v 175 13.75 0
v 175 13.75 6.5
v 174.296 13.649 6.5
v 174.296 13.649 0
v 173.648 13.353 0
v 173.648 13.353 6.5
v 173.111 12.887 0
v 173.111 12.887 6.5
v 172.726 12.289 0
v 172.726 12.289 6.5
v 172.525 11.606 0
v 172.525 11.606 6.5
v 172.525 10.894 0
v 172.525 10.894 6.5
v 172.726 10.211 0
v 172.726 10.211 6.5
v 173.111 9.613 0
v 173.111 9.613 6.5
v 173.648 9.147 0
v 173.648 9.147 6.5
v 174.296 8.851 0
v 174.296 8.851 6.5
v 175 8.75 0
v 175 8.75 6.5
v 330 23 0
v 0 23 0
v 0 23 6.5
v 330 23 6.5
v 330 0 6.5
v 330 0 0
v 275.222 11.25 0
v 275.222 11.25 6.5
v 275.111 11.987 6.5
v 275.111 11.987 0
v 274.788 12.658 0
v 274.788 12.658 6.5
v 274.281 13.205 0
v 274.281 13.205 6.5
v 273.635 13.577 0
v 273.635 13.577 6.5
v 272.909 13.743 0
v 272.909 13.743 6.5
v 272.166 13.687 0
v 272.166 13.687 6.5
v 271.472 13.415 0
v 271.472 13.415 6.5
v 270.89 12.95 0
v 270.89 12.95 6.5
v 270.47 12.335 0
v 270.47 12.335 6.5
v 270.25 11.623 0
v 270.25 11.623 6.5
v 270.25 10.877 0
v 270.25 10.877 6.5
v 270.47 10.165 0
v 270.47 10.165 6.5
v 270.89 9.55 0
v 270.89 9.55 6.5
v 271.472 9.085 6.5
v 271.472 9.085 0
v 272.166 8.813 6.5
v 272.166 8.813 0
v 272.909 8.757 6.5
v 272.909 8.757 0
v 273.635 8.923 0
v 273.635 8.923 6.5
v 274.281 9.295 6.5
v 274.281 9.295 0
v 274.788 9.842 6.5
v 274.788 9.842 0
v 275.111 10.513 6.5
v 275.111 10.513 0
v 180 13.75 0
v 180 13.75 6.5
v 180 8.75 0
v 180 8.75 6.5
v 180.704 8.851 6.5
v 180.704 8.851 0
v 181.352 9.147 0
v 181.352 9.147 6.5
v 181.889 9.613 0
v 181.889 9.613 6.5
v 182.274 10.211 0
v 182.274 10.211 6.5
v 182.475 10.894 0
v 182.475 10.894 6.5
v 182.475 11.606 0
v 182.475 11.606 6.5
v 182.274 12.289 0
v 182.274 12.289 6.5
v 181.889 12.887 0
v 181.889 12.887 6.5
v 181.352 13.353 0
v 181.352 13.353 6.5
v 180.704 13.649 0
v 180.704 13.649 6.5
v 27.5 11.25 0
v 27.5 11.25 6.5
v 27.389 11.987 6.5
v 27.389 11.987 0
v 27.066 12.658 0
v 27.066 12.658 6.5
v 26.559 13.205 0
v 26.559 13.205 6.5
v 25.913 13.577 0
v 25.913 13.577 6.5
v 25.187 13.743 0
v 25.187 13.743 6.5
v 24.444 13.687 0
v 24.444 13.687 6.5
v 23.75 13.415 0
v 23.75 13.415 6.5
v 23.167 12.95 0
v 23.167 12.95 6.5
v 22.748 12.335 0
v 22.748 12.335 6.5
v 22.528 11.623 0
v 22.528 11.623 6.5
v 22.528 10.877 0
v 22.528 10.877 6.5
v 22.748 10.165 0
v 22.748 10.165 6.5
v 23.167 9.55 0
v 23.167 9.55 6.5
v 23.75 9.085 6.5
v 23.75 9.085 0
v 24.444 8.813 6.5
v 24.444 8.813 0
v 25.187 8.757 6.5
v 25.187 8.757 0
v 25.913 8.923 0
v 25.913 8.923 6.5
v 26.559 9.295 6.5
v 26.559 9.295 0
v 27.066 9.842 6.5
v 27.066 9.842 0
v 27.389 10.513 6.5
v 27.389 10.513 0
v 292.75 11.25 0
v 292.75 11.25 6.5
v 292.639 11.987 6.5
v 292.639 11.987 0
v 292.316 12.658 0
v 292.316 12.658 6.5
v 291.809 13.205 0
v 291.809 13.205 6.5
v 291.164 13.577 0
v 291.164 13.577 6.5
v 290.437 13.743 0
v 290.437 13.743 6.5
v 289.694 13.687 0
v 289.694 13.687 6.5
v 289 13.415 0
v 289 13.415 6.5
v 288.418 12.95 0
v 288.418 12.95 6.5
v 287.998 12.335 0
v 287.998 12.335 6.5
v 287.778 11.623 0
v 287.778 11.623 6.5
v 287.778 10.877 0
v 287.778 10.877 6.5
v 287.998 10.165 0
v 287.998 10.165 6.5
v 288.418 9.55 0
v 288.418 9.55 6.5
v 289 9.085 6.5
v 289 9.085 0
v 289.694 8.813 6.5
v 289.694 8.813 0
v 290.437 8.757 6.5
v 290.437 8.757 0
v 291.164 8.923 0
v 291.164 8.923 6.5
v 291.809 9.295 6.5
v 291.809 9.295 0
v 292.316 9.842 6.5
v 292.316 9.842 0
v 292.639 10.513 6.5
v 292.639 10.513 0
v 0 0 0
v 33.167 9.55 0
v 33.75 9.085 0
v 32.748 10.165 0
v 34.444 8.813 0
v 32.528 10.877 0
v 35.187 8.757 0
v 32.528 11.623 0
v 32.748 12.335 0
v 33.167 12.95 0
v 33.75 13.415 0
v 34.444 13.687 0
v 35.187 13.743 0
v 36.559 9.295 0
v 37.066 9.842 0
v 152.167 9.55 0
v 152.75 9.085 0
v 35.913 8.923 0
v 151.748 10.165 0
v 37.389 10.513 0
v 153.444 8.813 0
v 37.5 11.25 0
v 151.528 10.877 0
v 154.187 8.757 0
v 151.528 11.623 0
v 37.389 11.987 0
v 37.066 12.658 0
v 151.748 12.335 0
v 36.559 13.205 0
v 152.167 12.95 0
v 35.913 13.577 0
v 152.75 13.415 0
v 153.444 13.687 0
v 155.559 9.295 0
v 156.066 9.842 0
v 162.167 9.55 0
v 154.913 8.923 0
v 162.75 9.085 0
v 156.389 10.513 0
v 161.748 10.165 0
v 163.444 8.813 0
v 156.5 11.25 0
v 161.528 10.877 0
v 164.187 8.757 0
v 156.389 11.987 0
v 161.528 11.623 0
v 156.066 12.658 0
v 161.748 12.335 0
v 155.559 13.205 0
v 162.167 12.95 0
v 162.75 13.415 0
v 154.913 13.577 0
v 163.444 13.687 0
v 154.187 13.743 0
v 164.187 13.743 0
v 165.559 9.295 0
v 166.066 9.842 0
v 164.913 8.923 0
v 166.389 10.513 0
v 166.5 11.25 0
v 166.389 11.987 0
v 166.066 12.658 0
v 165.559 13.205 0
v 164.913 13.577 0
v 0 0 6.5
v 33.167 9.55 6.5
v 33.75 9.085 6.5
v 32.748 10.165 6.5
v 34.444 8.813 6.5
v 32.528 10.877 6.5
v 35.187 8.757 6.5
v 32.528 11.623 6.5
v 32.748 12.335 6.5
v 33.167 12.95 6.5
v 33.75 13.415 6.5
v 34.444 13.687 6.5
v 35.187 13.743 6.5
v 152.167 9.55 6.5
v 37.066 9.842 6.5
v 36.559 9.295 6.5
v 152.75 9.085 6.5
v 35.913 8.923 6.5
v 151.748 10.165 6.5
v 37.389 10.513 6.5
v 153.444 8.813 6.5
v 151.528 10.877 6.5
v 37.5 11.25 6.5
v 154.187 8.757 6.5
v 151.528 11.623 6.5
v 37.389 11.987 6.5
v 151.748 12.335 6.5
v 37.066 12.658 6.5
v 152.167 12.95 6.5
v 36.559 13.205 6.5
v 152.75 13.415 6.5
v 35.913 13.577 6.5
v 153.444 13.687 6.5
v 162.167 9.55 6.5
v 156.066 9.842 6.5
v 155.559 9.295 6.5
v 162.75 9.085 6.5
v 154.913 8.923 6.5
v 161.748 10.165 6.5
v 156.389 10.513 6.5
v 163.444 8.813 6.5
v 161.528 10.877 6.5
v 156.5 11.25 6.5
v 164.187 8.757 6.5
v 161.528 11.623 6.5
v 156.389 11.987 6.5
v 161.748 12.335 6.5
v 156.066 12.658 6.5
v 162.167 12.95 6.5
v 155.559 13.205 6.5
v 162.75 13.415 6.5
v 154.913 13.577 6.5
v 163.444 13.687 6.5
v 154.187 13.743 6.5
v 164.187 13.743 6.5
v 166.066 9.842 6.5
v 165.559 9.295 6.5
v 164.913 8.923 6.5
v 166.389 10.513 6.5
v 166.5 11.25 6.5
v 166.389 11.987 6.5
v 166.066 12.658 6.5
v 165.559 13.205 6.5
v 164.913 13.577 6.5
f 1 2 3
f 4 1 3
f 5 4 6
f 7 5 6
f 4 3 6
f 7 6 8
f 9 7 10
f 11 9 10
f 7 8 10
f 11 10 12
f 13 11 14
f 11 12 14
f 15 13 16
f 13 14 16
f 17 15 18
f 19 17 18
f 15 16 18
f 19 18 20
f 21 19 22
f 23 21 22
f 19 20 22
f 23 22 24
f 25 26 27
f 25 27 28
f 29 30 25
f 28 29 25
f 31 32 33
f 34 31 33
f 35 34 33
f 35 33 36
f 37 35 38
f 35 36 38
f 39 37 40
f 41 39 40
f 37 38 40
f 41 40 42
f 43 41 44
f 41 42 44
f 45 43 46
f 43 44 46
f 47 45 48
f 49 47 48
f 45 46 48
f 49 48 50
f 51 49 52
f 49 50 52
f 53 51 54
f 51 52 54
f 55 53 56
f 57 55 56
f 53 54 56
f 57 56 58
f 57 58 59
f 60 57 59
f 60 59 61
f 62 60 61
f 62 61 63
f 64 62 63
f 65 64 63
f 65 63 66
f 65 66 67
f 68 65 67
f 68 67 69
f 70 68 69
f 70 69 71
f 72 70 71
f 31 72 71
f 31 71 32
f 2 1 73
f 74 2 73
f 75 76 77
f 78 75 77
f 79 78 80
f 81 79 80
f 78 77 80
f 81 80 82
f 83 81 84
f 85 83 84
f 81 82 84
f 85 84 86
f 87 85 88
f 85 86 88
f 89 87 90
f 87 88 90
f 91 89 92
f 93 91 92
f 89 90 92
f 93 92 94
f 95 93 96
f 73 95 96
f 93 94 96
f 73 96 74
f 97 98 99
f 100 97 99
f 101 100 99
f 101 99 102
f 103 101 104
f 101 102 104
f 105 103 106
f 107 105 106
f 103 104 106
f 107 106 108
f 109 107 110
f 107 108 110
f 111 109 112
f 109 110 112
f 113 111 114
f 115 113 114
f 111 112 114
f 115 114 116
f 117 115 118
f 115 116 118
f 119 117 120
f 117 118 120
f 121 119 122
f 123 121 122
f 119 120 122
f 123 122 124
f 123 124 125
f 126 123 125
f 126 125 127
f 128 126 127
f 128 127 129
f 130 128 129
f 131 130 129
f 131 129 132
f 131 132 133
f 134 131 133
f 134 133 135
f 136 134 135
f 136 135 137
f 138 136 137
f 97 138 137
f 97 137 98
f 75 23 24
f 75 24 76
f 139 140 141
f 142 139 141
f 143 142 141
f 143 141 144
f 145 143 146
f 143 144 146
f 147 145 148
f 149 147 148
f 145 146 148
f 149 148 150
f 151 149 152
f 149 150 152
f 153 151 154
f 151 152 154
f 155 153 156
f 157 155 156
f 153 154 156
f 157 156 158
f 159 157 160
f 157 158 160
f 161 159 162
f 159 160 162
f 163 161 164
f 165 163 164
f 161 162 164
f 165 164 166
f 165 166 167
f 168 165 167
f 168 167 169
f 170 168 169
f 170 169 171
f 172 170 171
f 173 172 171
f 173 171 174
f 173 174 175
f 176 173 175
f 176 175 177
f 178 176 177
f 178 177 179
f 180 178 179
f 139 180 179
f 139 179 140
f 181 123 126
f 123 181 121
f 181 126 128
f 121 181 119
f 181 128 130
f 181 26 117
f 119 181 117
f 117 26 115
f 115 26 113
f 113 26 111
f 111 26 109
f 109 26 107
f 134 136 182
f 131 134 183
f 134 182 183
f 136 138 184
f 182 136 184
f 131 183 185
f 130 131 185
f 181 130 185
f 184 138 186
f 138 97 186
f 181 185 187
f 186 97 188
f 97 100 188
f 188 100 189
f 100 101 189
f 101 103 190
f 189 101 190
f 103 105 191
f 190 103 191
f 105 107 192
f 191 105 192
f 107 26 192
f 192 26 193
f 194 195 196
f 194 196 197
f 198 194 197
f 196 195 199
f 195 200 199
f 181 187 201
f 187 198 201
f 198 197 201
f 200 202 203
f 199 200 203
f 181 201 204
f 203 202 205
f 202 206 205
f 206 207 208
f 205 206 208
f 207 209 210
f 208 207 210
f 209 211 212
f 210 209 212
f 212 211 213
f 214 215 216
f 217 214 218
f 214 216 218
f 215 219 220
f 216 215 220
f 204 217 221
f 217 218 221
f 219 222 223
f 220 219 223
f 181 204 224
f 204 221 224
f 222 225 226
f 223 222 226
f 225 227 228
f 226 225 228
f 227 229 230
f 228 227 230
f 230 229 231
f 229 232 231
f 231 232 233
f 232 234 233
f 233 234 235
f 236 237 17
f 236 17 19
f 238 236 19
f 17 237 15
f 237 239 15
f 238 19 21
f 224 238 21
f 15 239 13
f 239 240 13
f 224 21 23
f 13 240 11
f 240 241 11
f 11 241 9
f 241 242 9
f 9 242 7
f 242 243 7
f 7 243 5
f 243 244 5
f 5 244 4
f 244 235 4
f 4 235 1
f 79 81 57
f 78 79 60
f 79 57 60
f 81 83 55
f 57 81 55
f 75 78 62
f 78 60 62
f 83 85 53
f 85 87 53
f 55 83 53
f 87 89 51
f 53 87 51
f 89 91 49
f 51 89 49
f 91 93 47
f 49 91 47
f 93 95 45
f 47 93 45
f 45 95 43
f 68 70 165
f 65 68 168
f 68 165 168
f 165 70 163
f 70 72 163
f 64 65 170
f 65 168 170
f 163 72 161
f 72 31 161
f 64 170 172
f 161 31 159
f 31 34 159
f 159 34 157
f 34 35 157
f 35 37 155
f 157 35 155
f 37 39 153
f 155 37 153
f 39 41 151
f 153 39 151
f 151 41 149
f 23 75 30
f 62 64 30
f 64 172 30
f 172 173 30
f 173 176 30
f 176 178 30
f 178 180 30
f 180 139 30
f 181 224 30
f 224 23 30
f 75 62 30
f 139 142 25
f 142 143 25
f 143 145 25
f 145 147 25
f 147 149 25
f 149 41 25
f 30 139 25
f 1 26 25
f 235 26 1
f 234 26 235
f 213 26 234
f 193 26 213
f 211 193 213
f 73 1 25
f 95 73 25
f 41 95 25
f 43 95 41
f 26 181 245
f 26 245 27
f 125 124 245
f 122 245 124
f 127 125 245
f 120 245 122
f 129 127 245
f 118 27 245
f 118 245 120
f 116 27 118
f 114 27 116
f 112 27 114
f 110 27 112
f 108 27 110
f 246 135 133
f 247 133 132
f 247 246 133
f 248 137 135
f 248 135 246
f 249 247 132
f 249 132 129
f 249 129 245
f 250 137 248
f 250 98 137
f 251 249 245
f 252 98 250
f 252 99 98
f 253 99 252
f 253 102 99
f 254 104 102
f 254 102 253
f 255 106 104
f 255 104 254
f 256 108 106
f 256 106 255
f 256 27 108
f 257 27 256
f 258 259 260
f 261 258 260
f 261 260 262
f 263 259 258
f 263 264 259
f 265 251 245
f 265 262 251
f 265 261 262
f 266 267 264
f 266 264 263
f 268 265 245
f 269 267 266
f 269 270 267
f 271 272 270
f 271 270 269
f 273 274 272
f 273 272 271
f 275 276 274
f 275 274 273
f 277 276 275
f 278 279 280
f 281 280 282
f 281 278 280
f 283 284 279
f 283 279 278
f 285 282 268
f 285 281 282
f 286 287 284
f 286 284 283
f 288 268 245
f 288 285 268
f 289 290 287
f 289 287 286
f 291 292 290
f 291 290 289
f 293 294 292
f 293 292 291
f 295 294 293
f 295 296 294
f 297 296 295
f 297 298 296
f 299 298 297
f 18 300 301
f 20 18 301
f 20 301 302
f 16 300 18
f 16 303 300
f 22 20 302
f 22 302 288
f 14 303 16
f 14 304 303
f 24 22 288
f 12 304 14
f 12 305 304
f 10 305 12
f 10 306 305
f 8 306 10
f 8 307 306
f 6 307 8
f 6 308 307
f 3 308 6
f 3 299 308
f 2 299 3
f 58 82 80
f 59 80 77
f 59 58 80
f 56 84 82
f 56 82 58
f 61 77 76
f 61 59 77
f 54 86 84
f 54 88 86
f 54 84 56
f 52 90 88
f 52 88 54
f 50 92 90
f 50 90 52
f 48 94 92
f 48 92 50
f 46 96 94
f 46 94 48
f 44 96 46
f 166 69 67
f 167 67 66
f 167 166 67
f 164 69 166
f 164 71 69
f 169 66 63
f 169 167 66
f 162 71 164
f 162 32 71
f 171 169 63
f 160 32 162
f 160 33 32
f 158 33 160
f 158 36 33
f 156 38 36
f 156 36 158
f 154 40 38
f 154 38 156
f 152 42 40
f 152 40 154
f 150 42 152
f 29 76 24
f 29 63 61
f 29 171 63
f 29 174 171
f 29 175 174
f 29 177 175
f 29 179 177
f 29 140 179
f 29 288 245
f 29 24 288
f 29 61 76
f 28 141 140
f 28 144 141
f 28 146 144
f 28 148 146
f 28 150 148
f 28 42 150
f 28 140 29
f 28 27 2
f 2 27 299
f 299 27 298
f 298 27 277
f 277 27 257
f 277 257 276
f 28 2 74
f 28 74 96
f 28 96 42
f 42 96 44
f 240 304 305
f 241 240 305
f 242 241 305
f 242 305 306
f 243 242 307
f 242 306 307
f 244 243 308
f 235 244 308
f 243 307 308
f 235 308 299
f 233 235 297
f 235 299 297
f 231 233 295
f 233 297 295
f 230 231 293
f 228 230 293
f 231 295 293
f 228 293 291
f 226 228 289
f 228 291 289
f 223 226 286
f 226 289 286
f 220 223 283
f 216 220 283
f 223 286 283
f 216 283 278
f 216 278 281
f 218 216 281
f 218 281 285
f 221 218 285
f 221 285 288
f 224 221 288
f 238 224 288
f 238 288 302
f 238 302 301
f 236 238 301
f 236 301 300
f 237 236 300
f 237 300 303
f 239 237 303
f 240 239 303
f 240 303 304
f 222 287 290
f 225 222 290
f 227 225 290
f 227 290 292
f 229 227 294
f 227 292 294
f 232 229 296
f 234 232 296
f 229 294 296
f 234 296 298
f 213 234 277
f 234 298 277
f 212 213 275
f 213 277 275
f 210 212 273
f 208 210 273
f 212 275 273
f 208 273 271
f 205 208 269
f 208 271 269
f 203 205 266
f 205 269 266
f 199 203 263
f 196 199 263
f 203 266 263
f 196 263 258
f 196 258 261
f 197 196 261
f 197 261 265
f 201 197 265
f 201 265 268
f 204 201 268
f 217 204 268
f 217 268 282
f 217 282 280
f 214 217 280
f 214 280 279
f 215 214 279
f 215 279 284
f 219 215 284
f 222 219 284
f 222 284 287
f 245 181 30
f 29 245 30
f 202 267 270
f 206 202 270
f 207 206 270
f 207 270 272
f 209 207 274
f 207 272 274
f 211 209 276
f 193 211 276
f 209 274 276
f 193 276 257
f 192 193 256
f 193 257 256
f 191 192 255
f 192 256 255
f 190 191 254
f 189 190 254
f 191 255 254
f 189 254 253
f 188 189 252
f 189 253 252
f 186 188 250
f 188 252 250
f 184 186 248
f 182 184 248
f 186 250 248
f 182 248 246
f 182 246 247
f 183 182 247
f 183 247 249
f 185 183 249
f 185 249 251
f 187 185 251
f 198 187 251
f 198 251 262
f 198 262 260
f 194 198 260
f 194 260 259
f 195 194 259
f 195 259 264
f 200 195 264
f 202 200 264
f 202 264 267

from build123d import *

# Parameters (mm, degrees)
SKETCH_W     = 330
SKETCH_H     = 23
PAD_DEPTH    = 6.5
SKETCH001_R  = 2.5
POCKET_DEPTH = 6.501


with BuildPart() as part:
    # Sketch → Pad (new body)
    with BuildSketch(Plane.XY):
        with Locations((165, 11.5)):
            Rectangle(SKETCH_W, SKETCH_H)
    extrude(amount=PAD_DEPTH)

    # Sketch001 (on Face6 of Pad) → Pocket (cut, through all)
    with BuildSketch(Plane.XY.offset(6.5)):
        with Locations((25, 11.25)):
            Circle(SKETCH001_R)
        with Locations((35, 11.25)):
            Circle(SKETCH001_R)
        with Locations((154, 11.25)):
            Circle(SKETCH001_R)
        with Locations((164, 11.25)):
            Circle(SKETCH001_R)
        with Locations((272.722137, 11.25)):
            Circle(SKETCH001_R)
        with Locations((290.250244, 11.25)):
            Circle(SKETCH001_R)
        with BuildLine():
            ThreePointArc((175, 13.75), (172.5, 11.25), (175, 8.75))
            Line((175, 8.75), (180, 8.75))
            ThreePointArc((180, 8.75), (182.5, 11.25), (180, 13.75))
            Line((175, 13.75), (180, 13.75))
        make_face()
    extrude(amount=-POCKET_DEPTH, mode=Mode.SUBTRACT)


solid = part.part
